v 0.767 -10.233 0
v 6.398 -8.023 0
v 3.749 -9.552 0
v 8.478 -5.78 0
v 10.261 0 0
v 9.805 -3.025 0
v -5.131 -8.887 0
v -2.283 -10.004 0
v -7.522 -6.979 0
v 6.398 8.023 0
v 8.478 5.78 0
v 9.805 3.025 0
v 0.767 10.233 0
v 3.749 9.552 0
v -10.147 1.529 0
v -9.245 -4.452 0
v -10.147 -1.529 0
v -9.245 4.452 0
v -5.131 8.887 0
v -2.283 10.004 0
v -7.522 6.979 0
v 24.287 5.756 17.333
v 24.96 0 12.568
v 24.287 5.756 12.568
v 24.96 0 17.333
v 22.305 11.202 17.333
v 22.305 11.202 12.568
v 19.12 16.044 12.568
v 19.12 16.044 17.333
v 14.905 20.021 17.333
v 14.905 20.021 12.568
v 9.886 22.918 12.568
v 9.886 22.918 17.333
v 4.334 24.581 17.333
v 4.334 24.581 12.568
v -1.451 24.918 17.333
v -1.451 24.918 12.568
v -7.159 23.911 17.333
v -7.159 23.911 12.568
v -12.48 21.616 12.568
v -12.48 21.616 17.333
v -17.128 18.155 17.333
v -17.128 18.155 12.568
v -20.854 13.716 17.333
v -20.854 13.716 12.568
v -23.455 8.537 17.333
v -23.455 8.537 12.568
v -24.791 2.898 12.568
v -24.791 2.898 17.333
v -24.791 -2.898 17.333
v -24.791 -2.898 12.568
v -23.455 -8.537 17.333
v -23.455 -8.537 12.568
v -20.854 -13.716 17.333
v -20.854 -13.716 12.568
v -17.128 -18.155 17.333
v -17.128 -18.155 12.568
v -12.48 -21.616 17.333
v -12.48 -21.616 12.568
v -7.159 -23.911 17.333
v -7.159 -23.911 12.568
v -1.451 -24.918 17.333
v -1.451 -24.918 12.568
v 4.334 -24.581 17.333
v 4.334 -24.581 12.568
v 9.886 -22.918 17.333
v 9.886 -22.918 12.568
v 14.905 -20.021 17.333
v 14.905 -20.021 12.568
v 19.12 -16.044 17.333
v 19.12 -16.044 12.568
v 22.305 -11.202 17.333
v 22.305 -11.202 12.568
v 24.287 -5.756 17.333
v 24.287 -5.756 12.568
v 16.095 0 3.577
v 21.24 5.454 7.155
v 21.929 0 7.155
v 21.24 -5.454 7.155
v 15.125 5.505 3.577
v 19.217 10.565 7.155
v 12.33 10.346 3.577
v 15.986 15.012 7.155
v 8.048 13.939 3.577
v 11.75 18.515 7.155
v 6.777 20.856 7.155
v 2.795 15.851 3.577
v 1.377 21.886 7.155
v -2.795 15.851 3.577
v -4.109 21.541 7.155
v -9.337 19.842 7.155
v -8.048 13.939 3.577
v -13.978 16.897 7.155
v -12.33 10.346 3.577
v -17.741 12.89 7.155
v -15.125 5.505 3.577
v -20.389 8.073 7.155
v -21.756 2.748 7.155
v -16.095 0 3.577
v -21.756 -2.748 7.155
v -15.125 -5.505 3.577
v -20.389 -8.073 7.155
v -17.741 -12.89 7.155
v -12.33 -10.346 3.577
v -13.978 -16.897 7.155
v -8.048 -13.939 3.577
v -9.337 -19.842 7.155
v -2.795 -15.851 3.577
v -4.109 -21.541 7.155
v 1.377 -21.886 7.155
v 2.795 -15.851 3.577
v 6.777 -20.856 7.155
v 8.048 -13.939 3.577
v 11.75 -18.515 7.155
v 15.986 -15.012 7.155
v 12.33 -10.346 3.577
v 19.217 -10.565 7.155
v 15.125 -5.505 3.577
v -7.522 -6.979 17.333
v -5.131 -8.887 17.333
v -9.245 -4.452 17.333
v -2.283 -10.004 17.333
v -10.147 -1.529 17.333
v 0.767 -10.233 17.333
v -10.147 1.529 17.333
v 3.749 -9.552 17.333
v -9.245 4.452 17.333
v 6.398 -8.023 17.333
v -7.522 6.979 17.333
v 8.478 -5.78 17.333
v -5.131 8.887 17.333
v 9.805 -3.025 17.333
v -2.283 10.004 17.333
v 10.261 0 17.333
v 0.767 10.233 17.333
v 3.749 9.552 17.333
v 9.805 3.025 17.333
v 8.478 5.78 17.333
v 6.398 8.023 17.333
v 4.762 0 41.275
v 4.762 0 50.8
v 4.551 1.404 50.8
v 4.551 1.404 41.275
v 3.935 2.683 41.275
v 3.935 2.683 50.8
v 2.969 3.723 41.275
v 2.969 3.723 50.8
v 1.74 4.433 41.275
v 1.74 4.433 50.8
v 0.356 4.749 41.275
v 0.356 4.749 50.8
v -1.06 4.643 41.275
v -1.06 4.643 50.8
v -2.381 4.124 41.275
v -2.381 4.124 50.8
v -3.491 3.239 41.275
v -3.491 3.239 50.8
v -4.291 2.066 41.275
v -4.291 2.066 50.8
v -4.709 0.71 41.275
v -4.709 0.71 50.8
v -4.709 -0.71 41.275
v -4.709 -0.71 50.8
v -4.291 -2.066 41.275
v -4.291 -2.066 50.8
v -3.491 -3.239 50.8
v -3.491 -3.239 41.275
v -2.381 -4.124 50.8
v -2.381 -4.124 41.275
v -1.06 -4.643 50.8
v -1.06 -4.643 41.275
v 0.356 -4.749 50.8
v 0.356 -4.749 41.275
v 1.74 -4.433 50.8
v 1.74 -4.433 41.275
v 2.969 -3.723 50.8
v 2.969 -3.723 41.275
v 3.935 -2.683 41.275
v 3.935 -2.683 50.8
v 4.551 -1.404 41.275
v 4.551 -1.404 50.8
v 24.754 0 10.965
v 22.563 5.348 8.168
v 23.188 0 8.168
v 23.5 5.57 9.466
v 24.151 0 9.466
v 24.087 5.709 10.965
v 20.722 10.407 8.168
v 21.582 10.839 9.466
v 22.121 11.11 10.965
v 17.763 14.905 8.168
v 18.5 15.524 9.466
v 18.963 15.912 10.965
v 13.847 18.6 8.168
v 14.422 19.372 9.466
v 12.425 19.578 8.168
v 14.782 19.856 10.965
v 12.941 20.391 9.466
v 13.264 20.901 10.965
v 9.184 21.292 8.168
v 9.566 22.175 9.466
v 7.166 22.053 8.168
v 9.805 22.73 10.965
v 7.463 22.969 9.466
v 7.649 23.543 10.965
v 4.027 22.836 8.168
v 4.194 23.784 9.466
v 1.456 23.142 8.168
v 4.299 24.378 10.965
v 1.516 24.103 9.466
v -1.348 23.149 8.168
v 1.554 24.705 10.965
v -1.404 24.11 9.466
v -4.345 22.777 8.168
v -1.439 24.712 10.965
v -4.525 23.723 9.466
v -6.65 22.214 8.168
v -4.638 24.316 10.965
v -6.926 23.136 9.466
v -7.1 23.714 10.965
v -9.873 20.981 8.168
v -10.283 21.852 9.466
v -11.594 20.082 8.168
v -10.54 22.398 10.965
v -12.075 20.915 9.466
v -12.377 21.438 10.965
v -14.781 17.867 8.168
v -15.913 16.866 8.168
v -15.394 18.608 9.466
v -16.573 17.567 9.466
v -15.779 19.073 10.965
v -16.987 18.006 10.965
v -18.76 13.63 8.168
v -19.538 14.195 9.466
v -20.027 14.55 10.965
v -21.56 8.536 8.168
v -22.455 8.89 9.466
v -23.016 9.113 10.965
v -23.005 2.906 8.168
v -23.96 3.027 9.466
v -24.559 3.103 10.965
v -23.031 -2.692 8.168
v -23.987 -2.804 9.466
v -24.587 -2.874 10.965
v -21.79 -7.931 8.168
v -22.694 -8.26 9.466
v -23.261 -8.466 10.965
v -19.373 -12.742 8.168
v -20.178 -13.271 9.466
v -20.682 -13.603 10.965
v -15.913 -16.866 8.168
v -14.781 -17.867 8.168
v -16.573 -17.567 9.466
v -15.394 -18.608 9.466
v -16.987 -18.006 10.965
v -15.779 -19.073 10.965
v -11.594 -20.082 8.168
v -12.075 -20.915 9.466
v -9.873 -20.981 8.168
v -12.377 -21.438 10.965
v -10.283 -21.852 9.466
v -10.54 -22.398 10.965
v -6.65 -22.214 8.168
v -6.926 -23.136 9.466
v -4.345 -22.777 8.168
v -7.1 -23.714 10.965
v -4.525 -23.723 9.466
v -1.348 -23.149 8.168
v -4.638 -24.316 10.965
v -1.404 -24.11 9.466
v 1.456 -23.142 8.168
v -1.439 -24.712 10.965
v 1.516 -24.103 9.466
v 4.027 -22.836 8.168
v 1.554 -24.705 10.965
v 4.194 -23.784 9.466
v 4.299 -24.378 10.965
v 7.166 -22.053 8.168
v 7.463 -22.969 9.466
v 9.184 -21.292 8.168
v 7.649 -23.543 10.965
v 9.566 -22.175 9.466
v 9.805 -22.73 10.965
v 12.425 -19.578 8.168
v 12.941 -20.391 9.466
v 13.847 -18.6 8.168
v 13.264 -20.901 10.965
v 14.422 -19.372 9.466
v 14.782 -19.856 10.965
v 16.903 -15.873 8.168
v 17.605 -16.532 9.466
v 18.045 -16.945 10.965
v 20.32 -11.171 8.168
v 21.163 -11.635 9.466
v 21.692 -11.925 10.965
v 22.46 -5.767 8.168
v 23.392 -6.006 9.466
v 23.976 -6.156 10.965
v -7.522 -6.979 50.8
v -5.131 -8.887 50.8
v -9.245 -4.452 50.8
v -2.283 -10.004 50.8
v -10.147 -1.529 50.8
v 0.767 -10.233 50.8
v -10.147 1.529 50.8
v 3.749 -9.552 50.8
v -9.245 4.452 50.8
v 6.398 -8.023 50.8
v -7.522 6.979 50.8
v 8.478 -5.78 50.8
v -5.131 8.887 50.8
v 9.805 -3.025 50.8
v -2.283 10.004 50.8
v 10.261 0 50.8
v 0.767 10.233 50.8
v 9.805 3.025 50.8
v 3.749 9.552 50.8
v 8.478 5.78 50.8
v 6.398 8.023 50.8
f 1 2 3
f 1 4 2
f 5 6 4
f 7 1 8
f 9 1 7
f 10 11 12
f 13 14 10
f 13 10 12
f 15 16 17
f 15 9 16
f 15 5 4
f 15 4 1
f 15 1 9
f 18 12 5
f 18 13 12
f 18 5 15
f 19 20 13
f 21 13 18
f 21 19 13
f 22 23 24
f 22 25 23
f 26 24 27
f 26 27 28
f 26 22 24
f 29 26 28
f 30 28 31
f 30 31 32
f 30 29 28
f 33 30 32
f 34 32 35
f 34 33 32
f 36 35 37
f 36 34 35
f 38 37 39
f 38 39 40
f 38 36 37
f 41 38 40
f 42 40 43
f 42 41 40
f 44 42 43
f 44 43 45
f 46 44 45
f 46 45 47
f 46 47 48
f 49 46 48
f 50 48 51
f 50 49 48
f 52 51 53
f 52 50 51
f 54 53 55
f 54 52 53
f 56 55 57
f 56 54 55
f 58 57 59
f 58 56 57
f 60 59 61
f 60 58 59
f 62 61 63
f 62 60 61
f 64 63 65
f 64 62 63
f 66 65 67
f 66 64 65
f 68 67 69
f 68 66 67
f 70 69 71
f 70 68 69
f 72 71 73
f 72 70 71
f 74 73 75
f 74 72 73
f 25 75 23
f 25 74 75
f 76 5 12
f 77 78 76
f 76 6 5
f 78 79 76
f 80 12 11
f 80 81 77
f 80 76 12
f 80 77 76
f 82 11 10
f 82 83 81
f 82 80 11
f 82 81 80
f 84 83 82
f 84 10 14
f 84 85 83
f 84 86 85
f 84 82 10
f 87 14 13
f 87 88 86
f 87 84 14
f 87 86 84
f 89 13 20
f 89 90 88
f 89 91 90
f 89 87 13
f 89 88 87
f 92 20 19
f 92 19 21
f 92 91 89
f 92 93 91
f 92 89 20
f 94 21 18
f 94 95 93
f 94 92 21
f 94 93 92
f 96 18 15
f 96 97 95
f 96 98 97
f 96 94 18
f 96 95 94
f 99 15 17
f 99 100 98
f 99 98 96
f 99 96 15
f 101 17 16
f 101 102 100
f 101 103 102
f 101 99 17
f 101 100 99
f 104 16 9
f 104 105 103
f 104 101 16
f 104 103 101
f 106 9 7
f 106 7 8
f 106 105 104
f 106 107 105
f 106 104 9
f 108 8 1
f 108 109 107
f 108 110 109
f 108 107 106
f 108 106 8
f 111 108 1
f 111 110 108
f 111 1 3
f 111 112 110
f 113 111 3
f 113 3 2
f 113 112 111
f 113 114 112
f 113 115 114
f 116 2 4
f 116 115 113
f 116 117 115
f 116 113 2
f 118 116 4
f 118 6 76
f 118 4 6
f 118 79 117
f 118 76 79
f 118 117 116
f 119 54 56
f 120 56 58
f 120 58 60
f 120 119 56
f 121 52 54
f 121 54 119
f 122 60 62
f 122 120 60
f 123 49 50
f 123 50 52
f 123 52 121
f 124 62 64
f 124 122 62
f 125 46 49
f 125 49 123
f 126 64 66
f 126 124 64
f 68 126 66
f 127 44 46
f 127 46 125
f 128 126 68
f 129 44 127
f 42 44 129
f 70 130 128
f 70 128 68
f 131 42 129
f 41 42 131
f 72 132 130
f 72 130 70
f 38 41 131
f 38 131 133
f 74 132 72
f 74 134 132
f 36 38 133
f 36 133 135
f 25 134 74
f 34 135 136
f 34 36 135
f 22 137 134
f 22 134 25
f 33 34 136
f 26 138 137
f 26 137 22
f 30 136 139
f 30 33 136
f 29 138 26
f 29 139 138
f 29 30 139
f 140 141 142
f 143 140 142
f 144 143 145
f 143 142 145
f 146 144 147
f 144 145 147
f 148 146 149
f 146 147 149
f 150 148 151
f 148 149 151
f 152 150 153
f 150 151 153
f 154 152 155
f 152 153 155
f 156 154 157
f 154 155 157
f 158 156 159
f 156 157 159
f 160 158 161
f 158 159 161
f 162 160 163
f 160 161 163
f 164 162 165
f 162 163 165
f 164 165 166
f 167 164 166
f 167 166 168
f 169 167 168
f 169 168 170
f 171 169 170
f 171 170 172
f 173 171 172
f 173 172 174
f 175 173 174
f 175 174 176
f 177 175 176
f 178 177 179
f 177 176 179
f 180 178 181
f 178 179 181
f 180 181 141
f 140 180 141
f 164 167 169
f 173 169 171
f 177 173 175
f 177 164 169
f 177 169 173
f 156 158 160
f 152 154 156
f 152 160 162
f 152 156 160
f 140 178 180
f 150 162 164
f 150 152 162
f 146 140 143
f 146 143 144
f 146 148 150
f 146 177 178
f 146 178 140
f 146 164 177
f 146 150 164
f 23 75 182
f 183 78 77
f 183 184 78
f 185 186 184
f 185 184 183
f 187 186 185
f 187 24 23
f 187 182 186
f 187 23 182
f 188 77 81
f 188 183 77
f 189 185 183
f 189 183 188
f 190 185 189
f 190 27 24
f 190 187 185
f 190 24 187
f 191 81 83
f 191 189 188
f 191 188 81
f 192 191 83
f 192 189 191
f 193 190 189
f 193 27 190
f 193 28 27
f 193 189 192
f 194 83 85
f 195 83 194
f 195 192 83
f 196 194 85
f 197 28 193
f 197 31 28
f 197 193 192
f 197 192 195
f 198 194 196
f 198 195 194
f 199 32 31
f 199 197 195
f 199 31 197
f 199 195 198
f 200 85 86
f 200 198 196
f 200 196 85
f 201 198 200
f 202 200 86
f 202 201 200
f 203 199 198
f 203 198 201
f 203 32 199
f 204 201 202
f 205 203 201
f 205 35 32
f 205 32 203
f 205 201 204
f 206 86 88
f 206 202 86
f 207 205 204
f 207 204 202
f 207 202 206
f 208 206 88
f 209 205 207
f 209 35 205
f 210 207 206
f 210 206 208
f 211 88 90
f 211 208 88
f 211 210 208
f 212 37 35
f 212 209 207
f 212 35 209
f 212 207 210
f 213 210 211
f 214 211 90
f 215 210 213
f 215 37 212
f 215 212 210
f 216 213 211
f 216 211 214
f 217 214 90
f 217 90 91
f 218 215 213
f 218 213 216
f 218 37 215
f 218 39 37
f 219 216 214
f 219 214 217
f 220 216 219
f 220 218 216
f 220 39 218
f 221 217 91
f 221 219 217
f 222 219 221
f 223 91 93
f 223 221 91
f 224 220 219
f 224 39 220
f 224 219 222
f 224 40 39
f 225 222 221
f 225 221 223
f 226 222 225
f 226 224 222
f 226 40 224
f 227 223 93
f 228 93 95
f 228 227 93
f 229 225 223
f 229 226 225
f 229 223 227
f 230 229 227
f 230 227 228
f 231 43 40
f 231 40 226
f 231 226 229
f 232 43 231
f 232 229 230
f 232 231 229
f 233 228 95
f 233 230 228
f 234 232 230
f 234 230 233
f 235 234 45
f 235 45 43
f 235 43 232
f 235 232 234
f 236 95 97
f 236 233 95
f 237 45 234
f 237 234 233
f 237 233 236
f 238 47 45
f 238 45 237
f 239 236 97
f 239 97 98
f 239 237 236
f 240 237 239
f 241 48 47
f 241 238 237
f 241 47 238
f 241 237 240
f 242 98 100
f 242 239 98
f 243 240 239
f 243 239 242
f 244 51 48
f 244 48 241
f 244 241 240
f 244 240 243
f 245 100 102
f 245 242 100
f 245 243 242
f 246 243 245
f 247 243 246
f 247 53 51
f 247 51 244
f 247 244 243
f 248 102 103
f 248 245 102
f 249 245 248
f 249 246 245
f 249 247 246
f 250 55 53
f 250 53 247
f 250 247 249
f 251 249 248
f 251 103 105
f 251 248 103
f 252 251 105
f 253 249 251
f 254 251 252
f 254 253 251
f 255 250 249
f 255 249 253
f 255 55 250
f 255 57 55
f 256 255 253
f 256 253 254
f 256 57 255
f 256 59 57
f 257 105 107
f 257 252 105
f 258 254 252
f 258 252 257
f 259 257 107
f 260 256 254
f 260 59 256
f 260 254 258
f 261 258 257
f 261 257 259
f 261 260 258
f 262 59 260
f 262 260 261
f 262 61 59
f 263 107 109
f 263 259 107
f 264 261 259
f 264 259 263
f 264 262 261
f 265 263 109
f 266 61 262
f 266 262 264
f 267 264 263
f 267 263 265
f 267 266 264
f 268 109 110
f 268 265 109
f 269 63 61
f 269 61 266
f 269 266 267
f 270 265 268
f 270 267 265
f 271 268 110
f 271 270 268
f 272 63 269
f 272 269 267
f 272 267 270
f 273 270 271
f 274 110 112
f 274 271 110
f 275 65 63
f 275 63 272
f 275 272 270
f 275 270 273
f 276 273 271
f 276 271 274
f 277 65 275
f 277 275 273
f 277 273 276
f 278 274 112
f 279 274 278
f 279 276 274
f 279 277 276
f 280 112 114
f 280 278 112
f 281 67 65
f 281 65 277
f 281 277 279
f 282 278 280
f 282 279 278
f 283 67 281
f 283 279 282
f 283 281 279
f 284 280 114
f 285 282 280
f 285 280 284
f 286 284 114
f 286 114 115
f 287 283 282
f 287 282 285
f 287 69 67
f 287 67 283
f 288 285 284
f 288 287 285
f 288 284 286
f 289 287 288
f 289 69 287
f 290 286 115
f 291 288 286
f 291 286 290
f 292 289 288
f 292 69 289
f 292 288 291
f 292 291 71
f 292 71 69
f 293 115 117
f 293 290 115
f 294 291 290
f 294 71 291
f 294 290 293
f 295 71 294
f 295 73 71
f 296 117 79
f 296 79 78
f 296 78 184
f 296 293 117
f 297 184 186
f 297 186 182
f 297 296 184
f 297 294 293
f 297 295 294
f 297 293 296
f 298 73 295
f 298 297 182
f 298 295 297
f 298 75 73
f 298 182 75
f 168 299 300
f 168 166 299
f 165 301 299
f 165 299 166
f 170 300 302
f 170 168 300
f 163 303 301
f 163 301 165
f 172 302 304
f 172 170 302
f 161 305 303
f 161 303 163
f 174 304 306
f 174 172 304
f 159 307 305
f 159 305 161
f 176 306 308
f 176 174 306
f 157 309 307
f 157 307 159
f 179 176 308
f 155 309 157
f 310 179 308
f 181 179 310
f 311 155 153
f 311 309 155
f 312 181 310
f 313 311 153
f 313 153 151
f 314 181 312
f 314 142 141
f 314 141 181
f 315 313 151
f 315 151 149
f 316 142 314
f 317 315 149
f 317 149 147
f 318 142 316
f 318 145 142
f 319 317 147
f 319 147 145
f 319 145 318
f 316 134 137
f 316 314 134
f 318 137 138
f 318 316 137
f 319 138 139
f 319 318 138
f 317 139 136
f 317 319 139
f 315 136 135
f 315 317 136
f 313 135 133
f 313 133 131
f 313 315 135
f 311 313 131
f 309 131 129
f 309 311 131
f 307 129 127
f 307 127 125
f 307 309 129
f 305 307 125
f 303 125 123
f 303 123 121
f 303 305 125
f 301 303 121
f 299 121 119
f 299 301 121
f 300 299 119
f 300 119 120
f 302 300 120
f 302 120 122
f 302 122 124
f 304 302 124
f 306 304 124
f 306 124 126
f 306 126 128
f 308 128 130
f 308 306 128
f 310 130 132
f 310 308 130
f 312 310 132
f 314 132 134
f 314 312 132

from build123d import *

# Parameters (mm, degrees)
F2_R     = 4.7625
F3_DEPTH = 9.525


with BuildPart() as f1:
    # F0 (on Front) → F1 (revolve)
    with BuildSketch(Plane.XZ):
        with BuildLine():
            Line((0, 50.8), (0, 0))
            Line((0, 0), (10.261248, 0))
            Line((10.261248, 0), (21.929258, 7.154912))
            ThreePointArc((21.929258, 7.154912), (24.1506, 9.46627), (24.959791, 12.568196))
            Line((24.959791, 12.568196), (24.959791, 17.333189))
            Line((24.959791, 17.333189), (10.261248, 17.333189))
            Line((10.261248, 17.333189), (10.261248, 50.8))
            Line((10.261248, 50.8), (0, 50.8))
        make_face()
    revolve(axis=Axis((0, 0, 25.4), (0, 0, 1)))

    # F2 (on face) → F3 (cut)
    with BuildSketch(Plane.XY.offset(50.8)):
        Circle(F2_R)
    extrude(amount=-F3_DEPTH, mode=Mode.SUBTRACT)


solid = f1.part
